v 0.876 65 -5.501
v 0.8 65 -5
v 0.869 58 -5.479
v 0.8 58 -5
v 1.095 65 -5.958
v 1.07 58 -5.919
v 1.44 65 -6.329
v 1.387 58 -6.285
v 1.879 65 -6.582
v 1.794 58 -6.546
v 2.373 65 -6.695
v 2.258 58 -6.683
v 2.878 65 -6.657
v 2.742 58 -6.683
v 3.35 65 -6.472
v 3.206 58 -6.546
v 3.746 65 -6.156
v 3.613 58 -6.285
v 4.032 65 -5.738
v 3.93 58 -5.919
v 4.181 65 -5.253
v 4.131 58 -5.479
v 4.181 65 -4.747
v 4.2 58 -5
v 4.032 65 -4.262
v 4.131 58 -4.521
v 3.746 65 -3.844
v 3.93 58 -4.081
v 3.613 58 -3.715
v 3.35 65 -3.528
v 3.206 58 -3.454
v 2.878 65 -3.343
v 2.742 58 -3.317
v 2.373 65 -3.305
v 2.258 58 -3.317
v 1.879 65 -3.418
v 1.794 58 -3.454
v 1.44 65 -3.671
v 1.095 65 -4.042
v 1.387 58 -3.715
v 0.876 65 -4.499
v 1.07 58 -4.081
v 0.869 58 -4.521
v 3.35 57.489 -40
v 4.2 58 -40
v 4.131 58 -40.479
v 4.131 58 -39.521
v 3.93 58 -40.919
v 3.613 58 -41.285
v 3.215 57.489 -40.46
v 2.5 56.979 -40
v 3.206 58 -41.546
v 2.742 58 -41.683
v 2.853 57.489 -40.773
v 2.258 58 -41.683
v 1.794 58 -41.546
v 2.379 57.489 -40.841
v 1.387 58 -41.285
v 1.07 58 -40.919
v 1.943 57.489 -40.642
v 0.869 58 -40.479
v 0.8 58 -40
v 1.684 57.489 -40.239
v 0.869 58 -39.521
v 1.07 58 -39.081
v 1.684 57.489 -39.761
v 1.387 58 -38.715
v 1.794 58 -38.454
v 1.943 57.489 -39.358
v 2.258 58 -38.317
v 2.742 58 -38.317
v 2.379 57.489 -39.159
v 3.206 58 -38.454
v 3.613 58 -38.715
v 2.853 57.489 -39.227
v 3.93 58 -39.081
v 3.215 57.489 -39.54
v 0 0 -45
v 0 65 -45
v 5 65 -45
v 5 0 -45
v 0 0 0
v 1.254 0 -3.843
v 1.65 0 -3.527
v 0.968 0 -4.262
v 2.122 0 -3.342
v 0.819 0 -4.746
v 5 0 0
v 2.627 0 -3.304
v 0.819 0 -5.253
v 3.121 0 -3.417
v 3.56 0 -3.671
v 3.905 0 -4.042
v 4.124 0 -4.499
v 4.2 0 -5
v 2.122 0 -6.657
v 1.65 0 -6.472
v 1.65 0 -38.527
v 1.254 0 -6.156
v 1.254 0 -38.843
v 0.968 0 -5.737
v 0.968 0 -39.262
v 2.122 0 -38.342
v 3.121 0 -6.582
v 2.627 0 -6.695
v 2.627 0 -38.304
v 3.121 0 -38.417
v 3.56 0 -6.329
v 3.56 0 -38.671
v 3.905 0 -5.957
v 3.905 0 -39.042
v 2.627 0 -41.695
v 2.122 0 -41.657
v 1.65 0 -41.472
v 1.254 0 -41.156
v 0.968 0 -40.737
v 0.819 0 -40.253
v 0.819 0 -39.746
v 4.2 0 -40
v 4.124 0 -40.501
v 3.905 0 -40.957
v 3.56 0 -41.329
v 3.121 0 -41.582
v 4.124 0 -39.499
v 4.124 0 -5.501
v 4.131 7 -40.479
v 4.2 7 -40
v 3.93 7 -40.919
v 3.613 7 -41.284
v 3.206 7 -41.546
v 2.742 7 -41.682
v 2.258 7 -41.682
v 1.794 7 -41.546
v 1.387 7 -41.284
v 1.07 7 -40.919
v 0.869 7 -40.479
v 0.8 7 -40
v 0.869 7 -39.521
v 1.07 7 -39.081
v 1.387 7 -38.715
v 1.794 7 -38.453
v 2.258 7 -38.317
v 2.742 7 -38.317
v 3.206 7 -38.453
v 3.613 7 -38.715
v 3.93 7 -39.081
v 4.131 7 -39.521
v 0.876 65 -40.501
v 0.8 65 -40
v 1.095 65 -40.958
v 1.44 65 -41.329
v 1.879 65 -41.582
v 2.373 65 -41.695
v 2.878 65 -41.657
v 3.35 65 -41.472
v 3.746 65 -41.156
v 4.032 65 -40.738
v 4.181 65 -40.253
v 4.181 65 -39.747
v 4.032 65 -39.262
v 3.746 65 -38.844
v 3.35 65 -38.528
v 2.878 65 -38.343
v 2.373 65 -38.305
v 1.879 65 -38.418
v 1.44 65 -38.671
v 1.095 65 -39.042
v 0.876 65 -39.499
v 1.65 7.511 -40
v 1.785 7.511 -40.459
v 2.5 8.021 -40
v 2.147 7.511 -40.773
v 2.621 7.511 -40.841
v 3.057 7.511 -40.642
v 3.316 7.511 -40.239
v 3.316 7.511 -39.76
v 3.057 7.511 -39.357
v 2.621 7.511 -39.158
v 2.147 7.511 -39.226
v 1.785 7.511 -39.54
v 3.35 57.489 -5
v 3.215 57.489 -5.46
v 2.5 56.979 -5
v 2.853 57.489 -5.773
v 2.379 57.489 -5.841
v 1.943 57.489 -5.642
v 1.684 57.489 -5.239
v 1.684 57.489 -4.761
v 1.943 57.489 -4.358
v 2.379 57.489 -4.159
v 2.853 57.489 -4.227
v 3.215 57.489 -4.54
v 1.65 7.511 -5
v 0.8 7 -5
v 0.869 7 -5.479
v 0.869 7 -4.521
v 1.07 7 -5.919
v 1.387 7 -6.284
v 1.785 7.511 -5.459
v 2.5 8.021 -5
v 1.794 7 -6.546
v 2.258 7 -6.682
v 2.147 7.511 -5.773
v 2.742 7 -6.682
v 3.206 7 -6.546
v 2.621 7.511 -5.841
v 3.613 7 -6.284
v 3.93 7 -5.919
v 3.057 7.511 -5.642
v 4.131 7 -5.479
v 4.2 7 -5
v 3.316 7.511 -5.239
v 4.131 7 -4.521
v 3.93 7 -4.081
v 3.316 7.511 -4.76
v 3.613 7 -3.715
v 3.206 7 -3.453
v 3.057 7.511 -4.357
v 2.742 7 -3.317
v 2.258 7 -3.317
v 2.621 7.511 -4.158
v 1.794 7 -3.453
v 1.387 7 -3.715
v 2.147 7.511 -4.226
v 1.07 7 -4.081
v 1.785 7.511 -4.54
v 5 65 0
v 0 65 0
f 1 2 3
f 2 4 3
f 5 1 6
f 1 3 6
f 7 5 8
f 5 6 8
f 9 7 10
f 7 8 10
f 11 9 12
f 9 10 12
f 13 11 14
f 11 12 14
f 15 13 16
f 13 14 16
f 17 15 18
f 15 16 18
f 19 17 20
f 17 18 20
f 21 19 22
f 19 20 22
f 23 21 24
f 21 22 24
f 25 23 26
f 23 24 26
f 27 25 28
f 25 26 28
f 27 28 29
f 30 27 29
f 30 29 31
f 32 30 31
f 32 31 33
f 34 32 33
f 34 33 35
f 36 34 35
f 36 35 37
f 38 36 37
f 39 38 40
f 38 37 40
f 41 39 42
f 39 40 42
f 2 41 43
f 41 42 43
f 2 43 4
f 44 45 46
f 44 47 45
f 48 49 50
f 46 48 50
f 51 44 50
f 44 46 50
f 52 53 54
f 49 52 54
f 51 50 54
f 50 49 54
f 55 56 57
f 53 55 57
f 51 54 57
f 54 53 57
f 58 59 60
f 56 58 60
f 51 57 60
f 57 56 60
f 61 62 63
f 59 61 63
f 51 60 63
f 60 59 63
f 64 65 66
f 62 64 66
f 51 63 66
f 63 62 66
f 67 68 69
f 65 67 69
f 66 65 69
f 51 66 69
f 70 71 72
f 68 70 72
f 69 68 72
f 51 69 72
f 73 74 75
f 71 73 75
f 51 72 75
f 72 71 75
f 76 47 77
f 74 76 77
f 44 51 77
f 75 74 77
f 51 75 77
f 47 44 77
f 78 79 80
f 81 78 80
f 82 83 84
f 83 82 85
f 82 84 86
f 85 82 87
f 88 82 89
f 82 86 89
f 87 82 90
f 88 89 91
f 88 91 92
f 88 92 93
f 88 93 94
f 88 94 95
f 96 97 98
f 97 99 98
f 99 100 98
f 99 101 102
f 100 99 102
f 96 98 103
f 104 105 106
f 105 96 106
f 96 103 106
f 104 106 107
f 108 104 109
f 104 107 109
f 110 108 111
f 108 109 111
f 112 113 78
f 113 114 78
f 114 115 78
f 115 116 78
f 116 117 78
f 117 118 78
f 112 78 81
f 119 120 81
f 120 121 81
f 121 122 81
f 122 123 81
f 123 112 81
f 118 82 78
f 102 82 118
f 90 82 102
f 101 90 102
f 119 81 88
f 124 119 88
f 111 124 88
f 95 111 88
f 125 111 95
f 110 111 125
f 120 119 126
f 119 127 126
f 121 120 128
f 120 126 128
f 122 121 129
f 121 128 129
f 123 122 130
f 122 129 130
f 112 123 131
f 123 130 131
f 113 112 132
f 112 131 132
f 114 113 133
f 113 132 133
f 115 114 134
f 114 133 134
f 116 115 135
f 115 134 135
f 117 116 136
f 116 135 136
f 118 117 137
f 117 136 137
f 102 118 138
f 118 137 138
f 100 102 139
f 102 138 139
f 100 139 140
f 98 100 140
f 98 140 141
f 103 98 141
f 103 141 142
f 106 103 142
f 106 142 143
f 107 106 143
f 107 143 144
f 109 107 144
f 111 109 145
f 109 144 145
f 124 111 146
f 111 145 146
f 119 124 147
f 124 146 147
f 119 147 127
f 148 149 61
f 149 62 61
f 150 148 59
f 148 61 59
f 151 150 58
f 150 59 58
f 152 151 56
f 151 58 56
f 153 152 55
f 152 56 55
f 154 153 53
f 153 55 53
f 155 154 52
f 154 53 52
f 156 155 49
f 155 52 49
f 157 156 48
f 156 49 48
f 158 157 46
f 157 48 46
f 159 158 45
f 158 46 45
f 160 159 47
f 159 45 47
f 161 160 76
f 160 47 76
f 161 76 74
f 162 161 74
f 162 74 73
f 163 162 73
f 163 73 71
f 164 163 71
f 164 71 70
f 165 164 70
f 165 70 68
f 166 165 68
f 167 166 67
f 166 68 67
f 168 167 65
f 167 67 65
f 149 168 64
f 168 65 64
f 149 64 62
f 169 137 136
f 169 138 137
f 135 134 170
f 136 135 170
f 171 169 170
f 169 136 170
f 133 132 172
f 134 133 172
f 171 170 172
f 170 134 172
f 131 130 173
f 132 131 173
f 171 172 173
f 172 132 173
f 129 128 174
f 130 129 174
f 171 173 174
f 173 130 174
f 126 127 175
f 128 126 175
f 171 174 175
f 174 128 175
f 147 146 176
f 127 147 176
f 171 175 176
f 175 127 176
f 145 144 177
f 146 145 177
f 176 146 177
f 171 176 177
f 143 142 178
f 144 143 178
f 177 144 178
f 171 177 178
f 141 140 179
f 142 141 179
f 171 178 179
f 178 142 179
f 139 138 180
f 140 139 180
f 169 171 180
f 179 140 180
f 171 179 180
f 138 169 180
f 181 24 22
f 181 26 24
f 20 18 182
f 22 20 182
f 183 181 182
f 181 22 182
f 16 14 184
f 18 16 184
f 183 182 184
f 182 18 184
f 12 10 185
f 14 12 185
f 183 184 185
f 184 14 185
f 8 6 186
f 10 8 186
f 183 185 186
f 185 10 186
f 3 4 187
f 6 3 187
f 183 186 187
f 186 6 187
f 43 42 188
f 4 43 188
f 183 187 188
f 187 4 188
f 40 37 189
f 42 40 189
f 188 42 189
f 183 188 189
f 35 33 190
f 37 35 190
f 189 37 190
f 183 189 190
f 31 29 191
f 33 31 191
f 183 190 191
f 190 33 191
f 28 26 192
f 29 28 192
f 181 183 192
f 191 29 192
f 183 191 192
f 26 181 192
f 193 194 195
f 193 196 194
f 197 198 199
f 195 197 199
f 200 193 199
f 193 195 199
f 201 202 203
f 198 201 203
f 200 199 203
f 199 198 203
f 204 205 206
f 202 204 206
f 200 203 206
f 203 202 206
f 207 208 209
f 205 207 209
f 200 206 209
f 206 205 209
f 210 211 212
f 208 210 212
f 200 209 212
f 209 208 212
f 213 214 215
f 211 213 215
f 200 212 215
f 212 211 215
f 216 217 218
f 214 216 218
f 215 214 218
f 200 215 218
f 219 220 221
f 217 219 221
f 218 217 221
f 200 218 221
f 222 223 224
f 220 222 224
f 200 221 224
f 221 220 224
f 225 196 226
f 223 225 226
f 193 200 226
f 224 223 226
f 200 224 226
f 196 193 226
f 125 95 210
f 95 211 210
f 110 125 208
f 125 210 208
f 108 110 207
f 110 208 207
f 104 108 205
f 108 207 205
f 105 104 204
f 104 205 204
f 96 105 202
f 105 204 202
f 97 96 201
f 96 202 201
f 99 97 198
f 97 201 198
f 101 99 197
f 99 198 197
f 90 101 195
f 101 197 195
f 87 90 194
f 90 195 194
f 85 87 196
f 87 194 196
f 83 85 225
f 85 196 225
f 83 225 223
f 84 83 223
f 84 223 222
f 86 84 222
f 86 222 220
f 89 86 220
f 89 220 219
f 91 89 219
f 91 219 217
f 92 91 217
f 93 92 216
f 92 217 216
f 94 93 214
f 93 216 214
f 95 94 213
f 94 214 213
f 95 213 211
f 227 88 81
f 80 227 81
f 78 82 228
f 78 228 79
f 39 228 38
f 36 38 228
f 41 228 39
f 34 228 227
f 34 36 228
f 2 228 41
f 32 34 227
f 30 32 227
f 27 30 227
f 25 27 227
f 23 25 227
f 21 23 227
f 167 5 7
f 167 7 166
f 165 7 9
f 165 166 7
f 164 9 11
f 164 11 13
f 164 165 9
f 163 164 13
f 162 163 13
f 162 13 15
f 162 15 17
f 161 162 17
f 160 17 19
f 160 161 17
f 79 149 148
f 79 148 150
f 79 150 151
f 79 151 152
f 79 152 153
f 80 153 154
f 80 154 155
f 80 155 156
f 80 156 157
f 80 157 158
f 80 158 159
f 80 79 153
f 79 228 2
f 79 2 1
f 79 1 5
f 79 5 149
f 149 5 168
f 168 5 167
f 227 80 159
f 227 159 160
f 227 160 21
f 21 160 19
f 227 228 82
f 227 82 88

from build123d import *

# Parameters (mm, degrees)
SKETCH1_W                = 5
SKETCH1_H                = 45
BOSS_EXTRUDE1_DEPTH      = 65
M3_CLEARANCE_HOLE1_D     = 3.4
M3_CLEARANCE_HOLE1_DEPTH = 7
M3_CLEARANCE_HOLE1_TIP   = 1.021463052
M3_CLEARANCE_HOLE2_D     = 3.4
M3_CLEARANCE_HOLE2_DEPTH = 7
M3_CLEARANCE_HOLE2_TIP   = 1.021463052


with BuildPart() as part:
    # Sketch1 → Boss-Extrude1 (new body)
    with BuildSketch(Plane(origin=(0, 0, 0), x_dir=(1, 0, 0), z_dir=(0, 1, 0))):
        with Locations((2.5, 22.5)):
            Rectangle(SKETCH1_W, SKETCH1_H)
    extrude(amount=BOSS_EXTRUDE1_DEPTH)

    # M3 Clearance Hole1
    with Locations(Plane(origin=(0, 65, 0), x_dir=(1, 0, 0), z_dir=(0, 1, 0))):
        with Locations((2.5, 40), (2.5, 5)):
            Hole(M3_CLEARANCE_HOLE1_D / 2, depth=M3_CLEARANCE_HOLE1_DEPTH)
            with Locations((0, 0, -(M3_CLEARANCE_HOLE1_DEPTH + M3_CLEARANCE_HOLE1_TIP / 2))):  # 118° drill point
                Cone(0, M3_CLEARANCE_HOLE1_D / 2, M3_CLEARANCE_HOLE1_TIP, mode=Mode.SUBTRACT)

    # M3 Clearance Hole2
    with Locations(Plane(origin=(0, 0, 0), x_dir=(-1, 0, 0), z_dir=(0, -1, 0))):
        with Locations((-2.5, 39.999655037), (-2.5, 4.999655037)):
            Hole(M3_CLEARANCE_HOLE2_D / 2, depth=M3_CLEARANCE_HOLE2_DEPTH)
            with Locations((0, 0, -(M3_CLEARANCE_HOLE2_DEPTH + M3_CLEARANCE_HOLE2_TIP / 2))):  # 118° drill point
                Cone(0, M3_CLEARANCE_HOLE2_D / 2, M3_CLEARANCE_HOLE2_TIP, mode=Mode.SUBTRACT)


solid = part.part
